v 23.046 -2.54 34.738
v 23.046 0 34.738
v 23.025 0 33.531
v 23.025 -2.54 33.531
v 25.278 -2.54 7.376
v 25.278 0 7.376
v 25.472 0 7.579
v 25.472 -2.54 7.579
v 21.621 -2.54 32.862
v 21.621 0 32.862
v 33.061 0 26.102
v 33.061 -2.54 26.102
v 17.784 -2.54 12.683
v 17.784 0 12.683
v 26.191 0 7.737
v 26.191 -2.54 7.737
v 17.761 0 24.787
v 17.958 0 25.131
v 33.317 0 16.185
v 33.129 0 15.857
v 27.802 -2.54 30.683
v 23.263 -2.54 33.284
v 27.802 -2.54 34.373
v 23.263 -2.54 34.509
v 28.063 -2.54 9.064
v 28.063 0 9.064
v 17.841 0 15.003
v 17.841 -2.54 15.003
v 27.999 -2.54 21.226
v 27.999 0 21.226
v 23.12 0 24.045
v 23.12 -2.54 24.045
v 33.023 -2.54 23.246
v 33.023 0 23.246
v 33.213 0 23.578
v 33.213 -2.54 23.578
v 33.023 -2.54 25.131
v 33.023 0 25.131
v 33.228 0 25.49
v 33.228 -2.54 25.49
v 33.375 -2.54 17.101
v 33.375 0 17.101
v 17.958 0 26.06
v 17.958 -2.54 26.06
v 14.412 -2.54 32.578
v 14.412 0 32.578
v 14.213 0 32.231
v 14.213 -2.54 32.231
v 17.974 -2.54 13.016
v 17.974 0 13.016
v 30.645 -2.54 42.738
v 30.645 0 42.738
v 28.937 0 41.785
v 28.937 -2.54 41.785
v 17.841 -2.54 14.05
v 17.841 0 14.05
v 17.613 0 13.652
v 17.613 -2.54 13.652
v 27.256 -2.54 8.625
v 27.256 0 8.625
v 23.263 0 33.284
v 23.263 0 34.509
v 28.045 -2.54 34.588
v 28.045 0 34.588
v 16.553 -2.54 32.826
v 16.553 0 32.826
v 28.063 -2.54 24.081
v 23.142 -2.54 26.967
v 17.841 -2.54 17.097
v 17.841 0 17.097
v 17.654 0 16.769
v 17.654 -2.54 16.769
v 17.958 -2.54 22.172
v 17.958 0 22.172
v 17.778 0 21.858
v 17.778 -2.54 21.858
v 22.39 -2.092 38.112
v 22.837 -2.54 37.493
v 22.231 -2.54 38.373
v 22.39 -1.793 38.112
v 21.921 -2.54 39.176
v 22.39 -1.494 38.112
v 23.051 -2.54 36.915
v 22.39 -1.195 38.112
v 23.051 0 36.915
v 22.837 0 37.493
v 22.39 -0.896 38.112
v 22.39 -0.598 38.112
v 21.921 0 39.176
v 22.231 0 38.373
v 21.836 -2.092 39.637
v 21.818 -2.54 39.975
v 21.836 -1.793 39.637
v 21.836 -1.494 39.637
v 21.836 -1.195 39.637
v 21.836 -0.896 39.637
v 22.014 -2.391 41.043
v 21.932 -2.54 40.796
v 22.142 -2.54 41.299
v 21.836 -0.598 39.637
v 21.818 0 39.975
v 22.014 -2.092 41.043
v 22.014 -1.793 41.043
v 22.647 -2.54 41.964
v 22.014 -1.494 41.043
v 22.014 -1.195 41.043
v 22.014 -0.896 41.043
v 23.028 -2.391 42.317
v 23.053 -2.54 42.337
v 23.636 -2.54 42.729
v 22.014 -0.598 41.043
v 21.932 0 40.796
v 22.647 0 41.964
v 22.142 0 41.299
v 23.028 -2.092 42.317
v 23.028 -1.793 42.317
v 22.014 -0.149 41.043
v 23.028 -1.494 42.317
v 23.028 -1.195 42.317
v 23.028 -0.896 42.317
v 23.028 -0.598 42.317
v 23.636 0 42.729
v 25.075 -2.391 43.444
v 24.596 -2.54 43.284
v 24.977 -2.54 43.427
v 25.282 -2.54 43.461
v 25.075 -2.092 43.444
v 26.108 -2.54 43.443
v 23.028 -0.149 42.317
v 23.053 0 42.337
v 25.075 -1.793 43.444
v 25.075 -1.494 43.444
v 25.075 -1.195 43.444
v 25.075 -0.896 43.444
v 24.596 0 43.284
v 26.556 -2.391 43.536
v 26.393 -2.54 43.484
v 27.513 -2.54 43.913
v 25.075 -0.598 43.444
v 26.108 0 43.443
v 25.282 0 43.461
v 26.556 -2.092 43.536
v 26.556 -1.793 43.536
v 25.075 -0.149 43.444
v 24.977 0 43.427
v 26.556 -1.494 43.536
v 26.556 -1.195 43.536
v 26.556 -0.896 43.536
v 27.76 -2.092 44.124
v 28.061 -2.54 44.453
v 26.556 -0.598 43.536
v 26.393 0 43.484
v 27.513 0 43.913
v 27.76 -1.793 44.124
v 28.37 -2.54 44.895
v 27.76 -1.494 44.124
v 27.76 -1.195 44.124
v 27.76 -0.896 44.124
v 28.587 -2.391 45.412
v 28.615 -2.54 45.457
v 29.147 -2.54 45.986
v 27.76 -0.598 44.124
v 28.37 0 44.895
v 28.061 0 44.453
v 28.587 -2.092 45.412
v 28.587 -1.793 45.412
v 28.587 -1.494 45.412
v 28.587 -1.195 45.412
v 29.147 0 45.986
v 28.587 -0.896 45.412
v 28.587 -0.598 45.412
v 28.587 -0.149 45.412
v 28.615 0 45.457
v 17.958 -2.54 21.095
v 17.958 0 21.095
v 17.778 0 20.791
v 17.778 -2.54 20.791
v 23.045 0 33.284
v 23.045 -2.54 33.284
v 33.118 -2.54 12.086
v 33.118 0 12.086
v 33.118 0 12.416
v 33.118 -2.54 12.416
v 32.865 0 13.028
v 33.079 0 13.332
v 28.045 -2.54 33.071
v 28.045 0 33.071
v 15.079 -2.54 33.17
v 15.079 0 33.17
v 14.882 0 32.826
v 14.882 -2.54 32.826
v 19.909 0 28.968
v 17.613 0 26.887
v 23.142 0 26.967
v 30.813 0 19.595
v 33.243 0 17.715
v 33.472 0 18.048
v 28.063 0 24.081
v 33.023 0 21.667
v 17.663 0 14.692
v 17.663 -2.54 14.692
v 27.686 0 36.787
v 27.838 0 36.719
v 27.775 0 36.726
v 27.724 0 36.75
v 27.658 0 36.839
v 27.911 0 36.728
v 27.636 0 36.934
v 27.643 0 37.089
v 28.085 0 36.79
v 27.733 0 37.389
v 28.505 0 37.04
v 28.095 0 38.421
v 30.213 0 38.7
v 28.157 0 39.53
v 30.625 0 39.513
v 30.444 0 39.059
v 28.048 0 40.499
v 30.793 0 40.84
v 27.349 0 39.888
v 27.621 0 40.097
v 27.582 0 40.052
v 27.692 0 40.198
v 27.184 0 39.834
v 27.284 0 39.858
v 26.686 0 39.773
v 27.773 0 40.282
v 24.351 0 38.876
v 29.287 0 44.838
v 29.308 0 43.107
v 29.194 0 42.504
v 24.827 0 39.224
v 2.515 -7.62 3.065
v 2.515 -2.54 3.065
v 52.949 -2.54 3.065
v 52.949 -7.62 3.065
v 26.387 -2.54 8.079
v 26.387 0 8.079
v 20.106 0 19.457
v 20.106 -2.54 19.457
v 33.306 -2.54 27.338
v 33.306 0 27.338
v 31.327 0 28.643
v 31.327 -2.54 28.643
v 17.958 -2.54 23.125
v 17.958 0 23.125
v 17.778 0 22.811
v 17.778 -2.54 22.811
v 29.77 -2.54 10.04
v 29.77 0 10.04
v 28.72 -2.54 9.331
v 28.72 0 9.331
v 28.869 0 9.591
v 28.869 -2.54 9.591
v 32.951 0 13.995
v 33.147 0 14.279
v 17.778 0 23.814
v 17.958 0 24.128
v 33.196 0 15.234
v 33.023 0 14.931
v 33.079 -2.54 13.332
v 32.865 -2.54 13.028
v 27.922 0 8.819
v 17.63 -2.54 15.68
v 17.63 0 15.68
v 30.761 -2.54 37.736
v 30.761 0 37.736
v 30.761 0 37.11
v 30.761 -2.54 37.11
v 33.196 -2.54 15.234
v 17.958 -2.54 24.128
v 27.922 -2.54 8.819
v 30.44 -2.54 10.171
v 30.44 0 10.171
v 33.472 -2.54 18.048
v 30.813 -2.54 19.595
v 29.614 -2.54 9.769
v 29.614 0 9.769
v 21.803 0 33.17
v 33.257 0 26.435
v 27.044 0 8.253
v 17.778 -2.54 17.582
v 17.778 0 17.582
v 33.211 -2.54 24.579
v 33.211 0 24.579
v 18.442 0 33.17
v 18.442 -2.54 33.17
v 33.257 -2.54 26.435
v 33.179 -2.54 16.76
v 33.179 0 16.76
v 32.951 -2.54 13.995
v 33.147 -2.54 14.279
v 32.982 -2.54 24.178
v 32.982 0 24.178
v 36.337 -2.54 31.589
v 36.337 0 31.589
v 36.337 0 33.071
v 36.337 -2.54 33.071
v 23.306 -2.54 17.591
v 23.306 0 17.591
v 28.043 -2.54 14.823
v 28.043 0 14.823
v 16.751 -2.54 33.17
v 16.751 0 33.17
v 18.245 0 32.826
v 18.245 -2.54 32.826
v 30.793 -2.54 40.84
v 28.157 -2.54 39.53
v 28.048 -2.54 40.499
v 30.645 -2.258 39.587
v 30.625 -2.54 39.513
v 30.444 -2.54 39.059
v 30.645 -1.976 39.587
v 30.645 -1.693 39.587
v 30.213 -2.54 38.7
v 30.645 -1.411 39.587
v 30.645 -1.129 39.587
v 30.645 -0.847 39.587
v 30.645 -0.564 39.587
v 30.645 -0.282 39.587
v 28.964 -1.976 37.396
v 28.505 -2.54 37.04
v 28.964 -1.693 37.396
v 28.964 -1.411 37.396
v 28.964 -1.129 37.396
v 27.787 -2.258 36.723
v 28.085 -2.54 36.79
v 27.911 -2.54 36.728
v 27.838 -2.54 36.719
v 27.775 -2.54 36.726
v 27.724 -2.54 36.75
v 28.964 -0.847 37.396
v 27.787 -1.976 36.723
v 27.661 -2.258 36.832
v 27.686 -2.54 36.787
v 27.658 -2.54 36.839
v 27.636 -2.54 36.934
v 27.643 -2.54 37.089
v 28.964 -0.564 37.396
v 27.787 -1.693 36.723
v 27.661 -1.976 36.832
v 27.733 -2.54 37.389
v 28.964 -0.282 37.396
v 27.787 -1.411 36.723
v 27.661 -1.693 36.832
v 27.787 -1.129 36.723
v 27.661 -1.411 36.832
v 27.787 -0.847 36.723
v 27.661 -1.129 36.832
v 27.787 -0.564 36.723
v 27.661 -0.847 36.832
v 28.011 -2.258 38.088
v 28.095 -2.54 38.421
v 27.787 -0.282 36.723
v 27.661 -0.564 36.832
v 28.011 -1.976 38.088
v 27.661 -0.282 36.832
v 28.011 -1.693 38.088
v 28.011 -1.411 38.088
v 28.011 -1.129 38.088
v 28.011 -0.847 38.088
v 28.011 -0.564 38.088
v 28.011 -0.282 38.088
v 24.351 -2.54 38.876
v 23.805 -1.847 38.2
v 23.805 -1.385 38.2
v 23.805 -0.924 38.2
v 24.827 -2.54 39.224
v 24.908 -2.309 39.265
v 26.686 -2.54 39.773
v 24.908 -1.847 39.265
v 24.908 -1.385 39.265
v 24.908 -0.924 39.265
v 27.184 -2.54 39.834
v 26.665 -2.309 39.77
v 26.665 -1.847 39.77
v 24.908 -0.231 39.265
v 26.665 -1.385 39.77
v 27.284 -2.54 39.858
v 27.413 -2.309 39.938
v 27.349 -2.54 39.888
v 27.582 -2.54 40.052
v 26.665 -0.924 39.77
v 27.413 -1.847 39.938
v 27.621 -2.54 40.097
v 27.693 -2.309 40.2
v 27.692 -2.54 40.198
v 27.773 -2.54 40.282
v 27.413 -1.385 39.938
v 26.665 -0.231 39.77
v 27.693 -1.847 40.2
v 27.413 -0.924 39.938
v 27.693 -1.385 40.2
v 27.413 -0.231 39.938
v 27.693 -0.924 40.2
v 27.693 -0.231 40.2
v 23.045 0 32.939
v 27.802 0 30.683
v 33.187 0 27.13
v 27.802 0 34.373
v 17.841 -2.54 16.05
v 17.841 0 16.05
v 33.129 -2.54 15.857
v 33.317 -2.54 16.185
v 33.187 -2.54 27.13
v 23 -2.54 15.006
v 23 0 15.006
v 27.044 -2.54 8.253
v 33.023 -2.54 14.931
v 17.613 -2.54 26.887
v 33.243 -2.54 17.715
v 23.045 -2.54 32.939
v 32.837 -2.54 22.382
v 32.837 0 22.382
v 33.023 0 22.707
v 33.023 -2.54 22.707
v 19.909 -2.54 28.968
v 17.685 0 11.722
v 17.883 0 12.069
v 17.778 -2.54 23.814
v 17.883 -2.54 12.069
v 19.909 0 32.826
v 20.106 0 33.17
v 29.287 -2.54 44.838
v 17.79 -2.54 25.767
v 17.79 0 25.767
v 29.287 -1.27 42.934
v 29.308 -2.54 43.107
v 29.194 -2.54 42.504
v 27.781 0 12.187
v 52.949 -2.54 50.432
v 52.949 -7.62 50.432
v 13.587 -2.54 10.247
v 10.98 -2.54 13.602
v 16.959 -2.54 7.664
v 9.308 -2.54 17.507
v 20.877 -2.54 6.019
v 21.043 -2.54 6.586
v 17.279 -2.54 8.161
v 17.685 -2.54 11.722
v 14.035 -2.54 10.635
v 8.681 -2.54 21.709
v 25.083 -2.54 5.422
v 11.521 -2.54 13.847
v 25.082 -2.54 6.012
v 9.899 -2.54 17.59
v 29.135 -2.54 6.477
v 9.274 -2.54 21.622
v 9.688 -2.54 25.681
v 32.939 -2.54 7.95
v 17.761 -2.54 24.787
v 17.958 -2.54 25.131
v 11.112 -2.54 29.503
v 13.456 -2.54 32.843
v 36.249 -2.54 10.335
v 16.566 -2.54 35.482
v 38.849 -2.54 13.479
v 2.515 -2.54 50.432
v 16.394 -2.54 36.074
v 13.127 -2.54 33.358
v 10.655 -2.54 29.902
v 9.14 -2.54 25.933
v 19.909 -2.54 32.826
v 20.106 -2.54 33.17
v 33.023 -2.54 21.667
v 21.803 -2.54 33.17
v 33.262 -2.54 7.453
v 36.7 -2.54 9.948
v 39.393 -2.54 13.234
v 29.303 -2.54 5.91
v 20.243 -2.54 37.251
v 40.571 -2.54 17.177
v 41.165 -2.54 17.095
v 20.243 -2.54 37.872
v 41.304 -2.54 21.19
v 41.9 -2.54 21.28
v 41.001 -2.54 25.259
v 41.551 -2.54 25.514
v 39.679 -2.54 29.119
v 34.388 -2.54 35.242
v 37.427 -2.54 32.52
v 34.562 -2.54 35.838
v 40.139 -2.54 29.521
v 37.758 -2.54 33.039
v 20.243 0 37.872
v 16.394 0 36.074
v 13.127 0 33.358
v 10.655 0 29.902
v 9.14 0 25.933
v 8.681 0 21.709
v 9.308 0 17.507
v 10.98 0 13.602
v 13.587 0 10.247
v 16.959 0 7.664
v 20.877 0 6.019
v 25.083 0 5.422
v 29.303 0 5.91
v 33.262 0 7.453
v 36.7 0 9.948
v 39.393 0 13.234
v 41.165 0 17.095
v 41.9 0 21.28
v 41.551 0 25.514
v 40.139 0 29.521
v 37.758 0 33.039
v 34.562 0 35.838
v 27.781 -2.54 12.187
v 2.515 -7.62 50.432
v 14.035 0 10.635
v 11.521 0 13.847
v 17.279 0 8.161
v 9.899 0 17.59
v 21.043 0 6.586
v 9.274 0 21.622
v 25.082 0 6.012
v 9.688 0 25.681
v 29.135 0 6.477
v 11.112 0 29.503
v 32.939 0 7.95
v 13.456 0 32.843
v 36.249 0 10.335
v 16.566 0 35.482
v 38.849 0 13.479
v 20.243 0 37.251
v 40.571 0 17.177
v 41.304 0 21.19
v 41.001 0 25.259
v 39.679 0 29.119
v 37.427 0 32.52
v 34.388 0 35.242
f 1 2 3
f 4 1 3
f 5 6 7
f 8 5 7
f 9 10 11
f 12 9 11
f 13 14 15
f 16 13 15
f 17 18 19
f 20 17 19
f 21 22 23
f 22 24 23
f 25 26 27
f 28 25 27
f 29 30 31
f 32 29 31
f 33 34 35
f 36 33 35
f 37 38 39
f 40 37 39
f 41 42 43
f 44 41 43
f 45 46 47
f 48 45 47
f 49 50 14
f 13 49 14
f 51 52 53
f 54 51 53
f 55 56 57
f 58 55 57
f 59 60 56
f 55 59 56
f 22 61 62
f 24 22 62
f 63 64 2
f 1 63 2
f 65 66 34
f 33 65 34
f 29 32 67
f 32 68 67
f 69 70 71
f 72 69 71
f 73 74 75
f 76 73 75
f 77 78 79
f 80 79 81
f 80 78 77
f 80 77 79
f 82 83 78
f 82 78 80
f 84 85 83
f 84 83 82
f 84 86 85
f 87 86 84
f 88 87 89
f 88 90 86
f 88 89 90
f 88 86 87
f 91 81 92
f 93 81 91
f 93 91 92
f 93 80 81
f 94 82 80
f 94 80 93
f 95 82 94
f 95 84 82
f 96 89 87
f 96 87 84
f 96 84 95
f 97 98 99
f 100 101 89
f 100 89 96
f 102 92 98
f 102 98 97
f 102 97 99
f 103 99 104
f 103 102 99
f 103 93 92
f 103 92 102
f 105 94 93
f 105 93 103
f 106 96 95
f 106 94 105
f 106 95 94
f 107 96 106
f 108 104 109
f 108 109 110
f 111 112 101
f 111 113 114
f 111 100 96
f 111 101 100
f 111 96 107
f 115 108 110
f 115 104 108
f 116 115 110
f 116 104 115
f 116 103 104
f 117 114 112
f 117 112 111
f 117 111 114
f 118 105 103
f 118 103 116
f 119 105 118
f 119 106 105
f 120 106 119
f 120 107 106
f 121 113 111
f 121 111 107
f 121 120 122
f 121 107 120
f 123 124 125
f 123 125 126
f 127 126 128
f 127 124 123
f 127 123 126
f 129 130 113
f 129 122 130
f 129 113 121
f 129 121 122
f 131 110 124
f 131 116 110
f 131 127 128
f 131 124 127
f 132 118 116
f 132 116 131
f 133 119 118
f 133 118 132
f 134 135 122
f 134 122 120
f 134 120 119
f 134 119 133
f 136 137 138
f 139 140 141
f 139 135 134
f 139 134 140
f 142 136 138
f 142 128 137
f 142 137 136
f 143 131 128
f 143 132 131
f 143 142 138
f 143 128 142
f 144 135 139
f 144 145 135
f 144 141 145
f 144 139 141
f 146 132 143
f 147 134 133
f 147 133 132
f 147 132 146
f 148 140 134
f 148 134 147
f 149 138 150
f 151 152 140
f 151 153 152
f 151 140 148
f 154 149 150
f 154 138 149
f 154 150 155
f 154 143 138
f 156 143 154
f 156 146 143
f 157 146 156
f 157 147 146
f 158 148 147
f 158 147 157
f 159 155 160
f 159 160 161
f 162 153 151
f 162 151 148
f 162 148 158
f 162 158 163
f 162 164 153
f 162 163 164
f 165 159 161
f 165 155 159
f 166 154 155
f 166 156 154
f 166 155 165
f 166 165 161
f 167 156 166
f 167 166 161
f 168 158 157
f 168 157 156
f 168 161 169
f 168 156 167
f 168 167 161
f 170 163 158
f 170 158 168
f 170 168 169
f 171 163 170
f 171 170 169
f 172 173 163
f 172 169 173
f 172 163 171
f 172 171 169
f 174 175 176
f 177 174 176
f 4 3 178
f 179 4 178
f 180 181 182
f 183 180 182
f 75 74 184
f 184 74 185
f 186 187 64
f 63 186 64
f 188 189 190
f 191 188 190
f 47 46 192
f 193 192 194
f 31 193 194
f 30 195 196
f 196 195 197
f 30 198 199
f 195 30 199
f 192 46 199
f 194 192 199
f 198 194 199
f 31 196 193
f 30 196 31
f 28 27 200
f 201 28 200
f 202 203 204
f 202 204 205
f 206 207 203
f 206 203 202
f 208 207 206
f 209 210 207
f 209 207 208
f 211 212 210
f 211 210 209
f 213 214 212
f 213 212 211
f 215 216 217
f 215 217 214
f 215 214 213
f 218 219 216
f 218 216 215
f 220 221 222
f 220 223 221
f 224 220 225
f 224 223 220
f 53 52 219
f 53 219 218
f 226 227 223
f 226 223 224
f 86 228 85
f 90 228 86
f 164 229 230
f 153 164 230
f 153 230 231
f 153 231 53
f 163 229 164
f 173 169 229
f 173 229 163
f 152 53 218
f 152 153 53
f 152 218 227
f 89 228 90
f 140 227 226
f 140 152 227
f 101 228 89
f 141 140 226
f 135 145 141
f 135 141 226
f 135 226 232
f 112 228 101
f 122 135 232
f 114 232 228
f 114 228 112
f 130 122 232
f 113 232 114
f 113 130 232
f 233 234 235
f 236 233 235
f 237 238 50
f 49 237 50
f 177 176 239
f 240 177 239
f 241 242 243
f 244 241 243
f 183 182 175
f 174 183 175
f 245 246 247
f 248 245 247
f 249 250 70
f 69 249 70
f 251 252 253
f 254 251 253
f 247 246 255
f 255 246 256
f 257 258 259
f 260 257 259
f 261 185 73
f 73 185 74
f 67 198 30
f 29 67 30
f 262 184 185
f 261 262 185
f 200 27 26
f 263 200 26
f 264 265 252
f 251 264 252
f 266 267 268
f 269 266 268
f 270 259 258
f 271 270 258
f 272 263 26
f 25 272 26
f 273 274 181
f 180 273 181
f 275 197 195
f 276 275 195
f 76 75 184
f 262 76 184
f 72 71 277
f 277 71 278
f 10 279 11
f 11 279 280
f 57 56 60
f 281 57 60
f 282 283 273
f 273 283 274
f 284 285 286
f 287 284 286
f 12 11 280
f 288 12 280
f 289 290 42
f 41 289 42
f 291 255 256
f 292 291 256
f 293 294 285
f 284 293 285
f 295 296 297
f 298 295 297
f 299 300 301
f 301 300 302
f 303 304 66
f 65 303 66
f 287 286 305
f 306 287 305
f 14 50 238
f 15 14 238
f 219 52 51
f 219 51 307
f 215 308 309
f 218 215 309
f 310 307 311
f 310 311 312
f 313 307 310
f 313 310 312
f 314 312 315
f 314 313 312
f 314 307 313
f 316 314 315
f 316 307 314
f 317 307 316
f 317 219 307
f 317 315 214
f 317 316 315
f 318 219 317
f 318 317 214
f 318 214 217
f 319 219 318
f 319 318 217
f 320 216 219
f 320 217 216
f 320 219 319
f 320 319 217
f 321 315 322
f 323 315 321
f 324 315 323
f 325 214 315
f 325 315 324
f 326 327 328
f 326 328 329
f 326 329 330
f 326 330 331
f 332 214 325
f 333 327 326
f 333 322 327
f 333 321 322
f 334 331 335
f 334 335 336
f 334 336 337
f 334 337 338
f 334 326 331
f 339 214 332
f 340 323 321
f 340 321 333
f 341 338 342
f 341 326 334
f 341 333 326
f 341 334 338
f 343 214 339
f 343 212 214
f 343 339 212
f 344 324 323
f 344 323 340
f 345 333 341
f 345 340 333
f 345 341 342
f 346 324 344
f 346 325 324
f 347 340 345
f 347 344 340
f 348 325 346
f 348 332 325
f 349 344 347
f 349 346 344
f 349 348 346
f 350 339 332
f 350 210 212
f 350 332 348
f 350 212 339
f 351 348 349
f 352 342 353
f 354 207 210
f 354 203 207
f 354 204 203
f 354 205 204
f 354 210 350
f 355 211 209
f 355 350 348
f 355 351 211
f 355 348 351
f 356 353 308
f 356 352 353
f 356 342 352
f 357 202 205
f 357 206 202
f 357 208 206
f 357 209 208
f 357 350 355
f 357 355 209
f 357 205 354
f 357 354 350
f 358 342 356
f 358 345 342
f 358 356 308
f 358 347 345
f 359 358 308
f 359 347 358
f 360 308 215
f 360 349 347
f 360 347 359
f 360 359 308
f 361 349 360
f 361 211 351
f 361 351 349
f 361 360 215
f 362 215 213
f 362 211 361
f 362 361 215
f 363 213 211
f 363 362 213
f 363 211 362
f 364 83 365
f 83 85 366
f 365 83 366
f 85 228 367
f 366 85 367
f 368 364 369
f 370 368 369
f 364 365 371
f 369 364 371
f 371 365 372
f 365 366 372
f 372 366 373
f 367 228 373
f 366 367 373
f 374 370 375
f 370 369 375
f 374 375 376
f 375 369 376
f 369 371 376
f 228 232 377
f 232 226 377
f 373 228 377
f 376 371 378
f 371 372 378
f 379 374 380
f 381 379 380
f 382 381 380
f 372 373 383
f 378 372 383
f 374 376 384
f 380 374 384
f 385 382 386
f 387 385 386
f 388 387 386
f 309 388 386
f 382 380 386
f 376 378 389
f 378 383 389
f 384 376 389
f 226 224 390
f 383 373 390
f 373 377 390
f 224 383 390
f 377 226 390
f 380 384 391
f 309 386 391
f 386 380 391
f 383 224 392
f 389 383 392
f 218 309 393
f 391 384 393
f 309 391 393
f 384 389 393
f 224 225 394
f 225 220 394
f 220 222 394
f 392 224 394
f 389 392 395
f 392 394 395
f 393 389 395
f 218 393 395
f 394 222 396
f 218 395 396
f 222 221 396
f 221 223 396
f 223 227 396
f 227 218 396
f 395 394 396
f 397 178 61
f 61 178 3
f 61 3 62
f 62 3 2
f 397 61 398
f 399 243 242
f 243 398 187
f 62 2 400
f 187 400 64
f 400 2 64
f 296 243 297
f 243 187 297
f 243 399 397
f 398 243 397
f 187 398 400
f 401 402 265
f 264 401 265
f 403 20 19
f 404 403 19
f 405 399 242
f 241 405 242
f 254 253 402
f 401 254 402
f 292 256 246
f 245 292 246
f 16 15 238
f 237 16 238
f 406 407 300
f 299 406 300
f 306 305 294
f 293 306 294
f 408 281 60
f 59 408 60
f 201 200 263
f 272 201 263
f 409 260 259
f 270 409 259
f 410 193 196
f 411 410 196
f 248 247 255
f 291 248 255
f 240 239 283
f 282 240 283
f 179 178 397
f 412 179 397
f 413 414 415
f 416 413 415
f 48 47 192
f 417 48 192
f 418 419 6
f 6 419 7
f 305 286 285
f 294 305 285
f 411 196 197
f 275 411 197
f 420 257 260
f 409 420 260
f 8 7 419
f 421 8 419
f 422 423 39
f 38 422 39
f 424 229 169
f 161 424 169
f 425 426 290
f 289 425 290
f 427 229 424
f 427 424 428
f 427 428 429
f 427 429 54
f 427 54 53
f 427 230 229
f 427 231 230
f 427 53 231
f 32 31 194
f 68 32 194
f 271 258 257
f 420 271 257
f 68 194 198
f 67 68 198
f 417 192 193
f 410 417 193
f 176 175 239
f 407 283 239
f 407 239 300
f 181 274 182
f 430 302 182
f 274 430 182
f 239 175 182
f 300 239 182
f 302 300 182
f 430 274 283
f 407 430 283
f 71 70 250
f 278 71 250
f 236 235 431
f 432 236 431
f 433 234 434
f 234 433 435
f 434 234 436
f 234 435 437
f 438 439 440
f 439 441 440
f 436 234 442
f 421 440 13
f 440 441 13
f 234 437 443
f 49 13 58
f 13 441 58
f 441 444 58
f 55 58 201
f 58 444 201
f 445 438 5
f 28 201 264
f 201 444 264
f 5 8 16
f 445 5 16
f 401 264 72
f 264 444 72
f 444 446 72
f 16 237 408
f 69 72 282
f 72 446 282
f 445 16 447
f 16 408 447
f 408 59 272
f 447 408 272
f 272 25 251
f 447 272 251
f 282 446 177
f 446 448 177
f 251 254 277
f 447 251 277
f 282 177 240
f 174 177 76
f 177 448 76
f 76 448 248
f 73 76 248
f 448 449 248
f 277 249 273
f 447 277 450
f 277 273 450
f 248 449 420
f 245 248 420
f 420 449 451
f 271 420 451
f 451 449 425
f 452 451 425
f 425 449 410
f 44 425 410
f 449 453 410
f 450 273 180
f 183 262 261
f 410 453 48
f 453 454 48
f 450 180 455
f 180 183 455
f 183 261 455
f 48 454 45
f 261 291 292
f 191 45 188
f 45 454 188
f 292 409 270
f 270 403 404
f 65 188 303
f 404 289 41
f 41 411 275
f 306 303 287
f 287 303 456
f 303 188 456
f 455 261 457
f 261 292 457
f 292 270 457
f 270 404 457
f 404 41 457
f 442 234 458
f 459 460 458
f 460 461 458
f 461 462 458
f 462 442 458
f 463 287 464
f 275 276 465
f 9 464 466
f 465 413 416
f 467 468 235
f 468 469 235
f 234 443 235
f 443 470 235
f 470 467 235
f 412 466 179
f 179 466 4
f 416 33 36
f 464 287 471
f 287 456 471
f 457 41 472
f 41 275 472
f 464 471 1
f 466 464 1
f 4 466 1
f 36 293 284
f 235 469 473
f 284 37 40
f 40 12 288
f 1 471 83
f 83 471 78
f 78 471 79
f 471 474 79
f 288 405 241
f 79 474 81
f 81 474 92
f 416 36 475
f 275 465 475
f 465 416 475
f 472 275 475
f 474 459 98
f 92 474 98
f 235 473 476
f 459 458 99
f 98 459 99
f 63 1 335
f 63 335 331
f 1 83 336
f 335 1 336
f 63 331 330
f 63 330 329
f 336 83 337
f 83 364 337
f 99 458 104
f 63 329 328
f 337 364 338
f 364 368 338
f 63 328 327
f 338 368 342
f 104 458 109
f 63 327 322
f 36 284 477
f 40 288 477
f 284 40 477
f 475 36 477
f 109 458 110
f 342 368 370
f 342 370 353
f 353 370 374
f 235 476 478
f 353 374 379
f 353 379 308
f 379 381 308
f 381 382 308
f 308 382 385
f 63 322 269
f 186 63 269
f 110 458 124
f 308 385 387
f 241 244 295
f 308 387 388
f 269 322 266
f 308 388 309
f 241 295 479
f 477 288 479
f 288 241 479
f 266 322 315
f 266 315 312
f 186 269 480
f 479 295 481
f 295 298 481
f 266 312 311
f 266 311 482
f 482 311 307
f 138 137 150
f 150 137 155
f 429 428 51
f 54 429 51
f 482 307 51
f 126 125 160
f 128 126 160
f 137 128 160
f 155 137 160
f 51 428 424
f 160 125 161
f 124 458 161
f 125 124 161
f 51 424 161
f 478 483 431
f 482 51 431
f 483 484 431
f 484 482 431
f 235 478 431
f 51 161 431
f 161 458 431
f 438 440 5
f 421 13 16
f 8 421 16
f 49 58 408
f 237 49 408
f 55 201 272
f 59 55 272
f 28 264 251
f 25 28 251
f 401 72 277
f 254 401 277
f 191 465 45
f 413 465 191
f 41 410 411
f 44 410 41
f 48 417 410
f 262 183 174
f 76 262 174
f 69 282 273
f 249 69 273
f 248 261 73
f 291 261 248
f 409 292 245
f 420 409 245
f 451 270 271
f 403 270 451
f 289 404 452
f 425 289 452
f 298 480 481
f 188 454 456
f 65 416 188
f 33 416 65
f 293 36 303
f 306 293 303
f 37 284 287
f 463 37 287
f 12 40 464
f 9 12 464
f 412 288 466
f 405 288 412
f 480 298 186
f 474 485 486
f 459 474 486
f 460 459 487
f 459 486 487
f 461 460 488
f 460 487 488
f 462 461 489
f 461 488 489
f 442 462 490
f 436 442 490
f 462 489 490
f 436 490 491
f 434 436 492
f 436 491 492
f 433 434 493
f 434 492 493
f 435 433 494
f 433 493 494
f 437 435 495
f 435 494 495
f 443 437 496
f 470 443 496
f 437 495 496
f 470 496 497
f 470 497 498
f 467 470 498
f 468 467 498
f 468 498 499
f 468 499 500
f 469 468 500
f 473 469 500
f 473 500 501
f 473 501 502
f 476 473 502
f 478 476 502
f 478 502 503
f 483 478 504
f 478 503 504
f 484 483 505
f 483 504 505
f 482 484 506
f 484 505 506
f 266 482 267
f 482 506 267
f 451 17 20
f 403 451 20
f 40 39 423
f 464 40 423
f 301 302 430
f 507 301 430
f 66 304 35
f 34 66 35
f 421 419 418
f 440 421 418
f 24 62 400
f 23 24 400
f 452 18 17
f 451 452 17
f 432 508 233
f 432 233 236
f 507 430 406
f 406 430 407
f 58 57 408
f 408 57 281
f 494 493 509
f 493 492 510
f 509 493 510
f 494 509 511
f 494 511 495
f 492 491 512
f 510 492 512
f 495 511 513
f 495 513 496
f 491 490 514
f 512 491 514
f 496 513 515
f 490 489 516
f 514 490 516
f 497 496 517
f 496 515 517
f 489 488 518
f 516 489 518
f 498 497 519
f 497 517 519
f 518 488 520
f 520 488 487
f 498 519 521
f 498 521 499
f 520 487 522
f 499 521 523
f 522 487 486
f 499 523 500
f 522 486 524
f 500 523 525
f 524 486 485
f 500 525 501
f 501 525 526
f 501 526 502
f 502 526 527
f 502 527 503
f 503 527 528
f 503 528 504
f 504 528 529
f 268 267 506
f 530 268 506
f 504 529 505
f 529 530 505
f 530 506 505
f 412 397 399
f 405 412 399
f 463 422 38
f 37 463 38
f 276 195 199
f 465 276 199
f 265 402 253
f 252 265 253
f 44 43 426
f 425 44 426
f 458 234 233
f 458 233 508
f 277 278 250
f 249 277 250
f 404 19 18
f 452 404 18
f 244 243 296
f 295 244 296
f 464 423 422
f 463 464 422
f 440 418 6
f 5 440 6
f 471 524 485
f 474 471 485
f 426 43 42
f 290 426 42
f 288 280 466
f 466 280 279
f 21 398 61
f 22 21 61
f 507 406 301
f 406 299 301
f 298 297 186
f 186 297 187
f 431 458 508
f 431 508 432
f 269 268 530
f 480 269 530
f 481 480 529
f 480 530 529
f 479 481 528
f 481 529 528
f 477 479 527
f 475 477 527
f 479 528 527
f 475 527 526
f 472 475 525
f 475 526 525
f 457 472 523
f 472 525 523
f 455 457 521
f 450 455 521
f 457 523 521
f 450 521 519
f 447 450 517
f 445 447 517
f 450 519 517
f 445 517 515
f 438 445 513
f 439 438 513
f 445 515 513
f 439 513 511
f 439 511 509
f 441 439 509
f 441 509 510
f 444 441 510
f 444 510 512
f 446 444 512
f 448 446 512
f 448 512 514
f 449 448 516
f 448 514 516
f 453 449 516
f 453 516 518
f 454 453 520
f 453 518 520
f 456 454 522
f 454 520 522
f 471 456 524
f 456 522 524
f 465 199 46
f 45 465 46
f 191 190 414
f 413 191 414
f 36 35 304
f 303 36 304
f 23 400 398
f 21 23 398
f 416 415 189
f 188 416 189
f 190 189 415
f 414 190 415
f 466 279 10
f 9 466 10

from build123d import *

# Parameters (mm, degrees)
F1_DEPTH = 2.54
F2_W     = 50.4335446749
F2_H     = 47.3673532251
F3_DEPTH = 5.08


# Not quite as in the source:
# - a feature names something its author has since deleted; it is built from what else it names


with BuildPart() as f1:
    # F0 (on Front) → F1 (new body)
    with BuildSketch(Plane.XZ):
        with BuildLine():
            Line((20.2425401959, 37.2512835941), (20.2425401959, 37.8724660293))
            ThreePointArc((20.2425401959, 37.8724660293), (25.0827531799, 5.42177238), (30.7611451277, 37.7363363557))
            Line((30.7611451277, 37.7363363557), (30.7611451277, 37.1095434926))
            ThreePointArc((30.7611451277, 37.1095434926), (25.0818490069, 6.0124710706), (20.2425401959, 37.2512835941))
        make_face()
    extrude(amount=F1_DEPTH)



with BuildPart() as f1b:
    # F0 (on Front) → F1, piece 2 (new body)
    with BuildSketch(Plane.XZ):
        with BuildLine():
            add(Edge.make_bspline(
                [(23.0514407158, 36.9153022766), (23.0000338532, 37.1051377654), (22.8899891699, 37.5115112571), (22.3511496369, 38.0986562322), (21.9858249437, 38.8447480675), (21.809539247, 39.6368045254), (21.813039047, 40.2648522584), (21.9686906382, 41.0721339012), (22.3787637159, 41.6567525791), (22.9775021785, 42.3782255437), (24.3228887053, 43.1166905037), (24.9982483073, 43.5418154349), (26.1666914194, 43.3968309792), (26.5298273051, 43.5335722369), (27.3608892448, 43.7811862144), (27.7584279708, 44.0883300962), (28.4498141772, 44.888079071), (28.5154236724, 45.4440168979), (28.92320837, 45.7942132009), (29.1466340423, 45.9860861301)],
                knots=[0, 0, 0, 0, 0.0514453921, 0.110127162, 0.171056953, 0.2301961795, 0.2830754093, 0.3422146359, 0.3975195588, 0.462072024, 0.5436046033, 0.6044006336, 0.6730540413, 0.7162652895, 0.7757385566, 0.8250838091, 0.8914195533, 0.940508657, 1, 1, 1, 1], degree=3))
            add(Edge.make_bspline(
                [(23.0514407158, 36.9153022766), (23.1528130098, 37.1260630271), (23.3607025921, 37.5582813649), (23.8028016121, 38.2012565529), (24.2676415464, 38.8465973471), (24.884509448, 39.3154758933), (25.8539932072, 39.587992103), (26.6019896914, 39.789301054), (27.3090151116, 39.8252756175), (27.3994263447, 39.9436529244), (27.6052961291, 40.0398924739), (27.6778788081, 40.2229303085), (27.9076828587, 40.3941993708), (28.0482787639, 40.498983115)],
                knots=[0, 0, 0, 0, 0.1035691547, 0.2123948021, 0.3213905308, 0.4288085843, 0.5510126252, 0.6639710224, 0.7625503685, 0.8077072913, 0.8630127537, 0.9161901374, 1, 1, 1, 1], degree=3))
            add(Edge.make_bspline(
                [(30.6448712945, 42.7375696599), (30.6857665771, 42.5799177306), (30.8089747033, 42.1049485515), (30.8481597012, 39.4706811929), (30.0006358069, 38.420435968), (29.0935620801, 37.4311516729), (27.7548428286, 36.4854500621), (27.5414798642, 37.1199299693), (28.1281216554, 38.0924200775), (28.2006198304, 39.4485309647), (28.0967658775, 40.1646452117), (28.0482787639, 40.498983115)],
                knots=[0, 0, 0, 0, 0.0811360963, 0.2444444876, 0.3629376576, 0.4864205288, 0.6058252757, 0.6665851424, 0.7746786569, 0.8948024484, 1, 1, 1, 1], degree=3))
            Line((30.6448712945, 42.7375696599), (28.9366003126, 41.7854189873))
            add(Edge.make_bspline(
                [(29.2866565287, 44.8379032314), (29.3276194284, 44.1605744561), (29.401104426, 42.9454870543), (29.0791063228, 42.1413182507), (28.9366003126, 41.7854189873)],
                knots=[0, 0, 0, 0, 0.5574321438, 1, 1, 1, 1], degree=3))
            Line((29.2866565287, 44.8379032314), (29.1466340423, 45.9860861301))
        make_face()
    extrude(amount=F1_DEPTH)


with BuildPart() as f1c:
    # F0 (on Front) → F1, piece 3 (new body)
    with BuildSketch(Plane.XZ):
        Polygon((33.2574028222, 26.435288895), (21.8032617122, 33.1698432565), (21.6212328523, 32.8617952764), (33.0605612282, 26.1021732809), align=None)
    extrude(amount=F1_DEPTH)


with BuildPart() as f1d:
    # F0 (on Front) → F1, piece 4 (new body)
    with BuildSketch(Plane.XZ):
        Polygon((33.228403627, 25.4895458259), (20.1059635729, 33.1698432565), (19.9089177924, 32.8258842821), (33.0227315426, 25.1305289567), align=None)
    extrude(amount=F1_DEPTH)


with BuildPart() as f1e:
    # F0 (on Front) → F1, piece 5 (new body)
    with BuildSketch(Plane.XZ):
        Polygon((33.2112317713, 24.5790107882), (18.4418894351, 33.1698432565), (18.2448436546, 32.8258842821), (32.9815978057, 24.1781665627), align=None)
    extrude(amount=F1_DEPTH)


with BuildPart() as f1f:
    # F0 (on Front) → F1, piece 6 (new body)
    with BuildSketch(Plane.XZ):
        Polygon((33.2125796453, 23.5776652022), (16.7505238205, 33.1698432565), (16.55347804, 32.8258842821), (33.0227315426, 23.2462703429), align=None)
    extrude(amount=F1_DEPTH)


with BuildPart() as f1g:
    # F0 (on Front) → F1, piece 7 (new body)
    with BuildSketch(Plane.XZ):
        Polygon((33.0227315426, 22.7067601114), (15.0789320469, 33.1698432565), (14.8818862664, 32.8258842821), (32.8367611378, 22.3821340801), align=None)
    extrude(amount=F1_DEPTH)


with BuildPart() as f1h:
    # F0 (on Front) → F1, piece 8 (new body)
    with BuildSketch(Plane.XZ):
        Polygon((33.3749822633, 17.101256154), (17.9576072842, 26.0595865548), (17.7897735171, 25.7666194572), (33.1791992282, 16.7595014014), align=None)
    extrude(amount=F1_DEPTH)


with BuildPart() as f1i:
    # F0 (on Front) → F1, piece 9 (new body)
    with BuildSketch(Plane.XZ):
        Polygon((33.3168466854, 16.1849598837), (17.9576072842, 25.1305289567), (17.76074414, 24.7868887884), (33.1290174507, 15.857089118), align=None)
    extrude(amount=F1_DEPTH)


with BuildPart() as f1j:
    # F0 (on Front) → F1, piece 10 (new body)
    with BuildSketch(Plane.XZ):
        Polygon((33.195942283, 15.2338305576), (17.9576072842, 24.1281539202), (17.7778732402, 23.8144139492), (33.0227315426, 14.9314775283), align=None)
    extrude(amount=F1_DEPTH)


with BuildPart() as f1k:
    # F0 (on Front) → F1, piece 11 (new body)
    with BuildSketch(Plane.XZ):
        Polygon((33.1469401717, 14.2789520323), (17.9576072842, 23.124800995), (17.7778732402, 22.811061024), (32.9511492616, 13.9945653465), align=None)
    extrude(amount=F1_DEPTH)


with BuildPart() as f1l:
    # F0 (on Front) → F1, piece 12 (new body)
    with BuildSketch(Plane.XZ):
        Polygon((33.0789424479, 13.332221657), (17.9576072842, 22.1720617265), (17.7778732402, 21.8583217555), (32.8649446067, 13.0281655517), align=None)
    extrude(amount=F1_DEPTH)


with BuildPart() as f1m:
    # F0 (on Front) → F1, piece 13 (new body)
    with BuildSketch(Plane.XZ):
        Polygon((29.7699026556, 10.0402957994), (17.841456458, 17.0968454331), (17.6537100383, 16.7688825837), (29.6143469321, 9.7685649275), align=None)
    extrude(amount=F1_DEPTH)


with BuildPart() as f1n:
    # F0 (on Front) → F1, piece 14 (new body)
    with BuildSketch(Plane.XZ):
        Polygon((28.8687120376, 9.5914553699), (17.841456458, 16.0501636565), (17.62953414, 15.6799693944), (28.7197476416, 9.3312384888), align=None)
    extrude(amount=F1_DEPTH)


with BuildPart() as f1o:
    # F0 (on Front) → F1, piece 15 (new body)
    with BuildSketch(Plane.XZ):
        Polygon((28.0626742242, 9.0640343876), (17.841456458, 15.0034837425), (17.6629371227, 14.6916391278), (27.9221774879, 8.8186091482), align=None)
    extrude(amount=F1_DEPTH)


with BuildPart() as f1p:
    # F0 (on Front) → F1, piece 16 (new body)
    with BuildSketch(Plane.XZ):
        Polygon((27.2564003965, 8.6249213116), (17.841456458, 14.0502564609), (17.6134166067, 13.6519074561), (27.0437242973, 8.2534103148), align=None)
    extrude(amount=F1_DEPTH)


with BuildPart() as f1q:
    # F0 (on Front) → F1, piece 17 (new body)
    with BuildSketch(Plane.XZ):
        Polygon((26.3865872887, 8.0787168843), (17.974415794, 13.0163198337), (17.7836155065, 12.6830223674), (26.1909458786, 7.7369627543), align=None)
    extrude(amount=F1_DEPTH)


with BuildPart() as f1r:
    # F0 (on Front) → F1, piece 18 (new body)
    with BuildSketch(Plane.XZ):
        Polygon((25.4722088575, 7.5785773806), (17.8834367543, 12.0687354356), (17.6850601811, 11.7222034147), (25.2775834555, 7.3757688617), align=None)
    extrude(amount=F1_DEPTH)


with BuildPart() as f1s:
    # F0 (on Front) → F1, piece 19 (new body)
    with BuildSketch(Plane.XZ):
        Polygon((33.1177413464, 12.4160759151), (17.9576072842, 21.0946835577), (17.7778732402, 20.7905191013), (20.1059635729, 19.4568124362), (17.7778732402, 17.5819434226), (30.4401450117, 10.1709731341), (33.1177413464, 12.0856873691), align=None)
        Polygon((22.9995213449, 15.0064639747), (23.3056563884, 17.5909493119), (28.043365106, 14.8232029751), (27.7810785919, 12.1866026893), align=None, mode=Mode.SUBTRACT)
    extrude(amount=F1_DEPTH)


with BuildPart() as f1t:
    # F0 (on Front) → F1, piece 20 (new body)
    with BuildSketch(Plane.XZ):
        Polygon((33.0227315426, 21.6672029346), (14.4121274352, 32.5775519013), (14.2134002971, 32.2306579844), (19.9089177924, 28.9678337124), (17.6128353924, 26.8874038011), (33.2432746912, 17.7152600915), (33.4723107517, 18.047504127), (30.8126039797, 19.594566601), align=None)
        Polygon((23.1198072433, 24.0452848375), (23.1421533972, 26.9667506218), (28.0626975, 24.0813326091), (27.9988050461, 21.2257355452), align=None, mode=Mode.SUBTRACT)
    extrude(amount=F1_DEPTH)


with BuildPart() as f1u:
    # F0 (on Front) → F1, piece 21 (new body)
    with BuildSketch(Plane.XZ):
        Polygon((23.0246130377, 33.5312858224), (23.0454113334, 33.2837961614), (23.0454113334, 32.939273864), (33.1866306884, 27.1296144809), (33.3058785922, 27.3377711162), (31.3267968595, 28.6425240338), (36.3370403647, 31.5886884928), (36.3370403647, 33.0705903471), (28.0454419553, 33.0705903471), (28.0454419553, 34.5877744257), (23.0461130826, 34.737955403), align=None)
        Polygon((23.2625063509, 33.2837961614), (23.2625063509, 33.5312858224), (23.2625063509, 34.509293735), (27.8020184487, 34.3729257584), (27.8020184487, 30.6832194328), align=None, mode=Mode.SUBTRACT)
    extrude(amount=F1_DEPTH)


with BuildPart() as f1_1:
    add(f1.part)

    add(f1b.part)  # F3 merges F1b

    add(f1c.part)  # F3 merges F1c

    add(f1d.part)  # F3 merges F1d

    add(f1e.part)  # F3 merges F1e

    add(f1f.part)  # F3 merges F1f

    add(f1g.part)  # F3 merges F1g

    add(f1h.part)  # F3 merges F1h

    add(f1i.part)  # F3 merges F1i

    add(f1j.part)  # F3 merges F1j

    add(f1k.part)  # F3 merges F1k

    add(f1l.part)  # F3 merges F1l

    add(f1m.part)  # F3 merges F1m

    add(f1n.part)  # F3 merges F1n

    add(f1o.part)  # F3 merges F1o

    add(f1p.part)  # F3 merges F1p

    add(f1q.part)  # F3 merges F1q

    add(f1r.part)  # F3 merges F1r

    add(f1s.part)  # F3 merges F1s

    add(f1t.part)  # F3 merges F1t

    add(f1u.part)  # F3 merges F1u
    # F2 (on face) → F3 (join)
    with BuildSketch(Plane.XZ.offset(2.54)):
        with Locations((27.7318180306, 26.7485658405)):
            Rectangle(F2_W, F2_H)
    extrude(amount=F3_DEPTH)


solid = f1_1.part
